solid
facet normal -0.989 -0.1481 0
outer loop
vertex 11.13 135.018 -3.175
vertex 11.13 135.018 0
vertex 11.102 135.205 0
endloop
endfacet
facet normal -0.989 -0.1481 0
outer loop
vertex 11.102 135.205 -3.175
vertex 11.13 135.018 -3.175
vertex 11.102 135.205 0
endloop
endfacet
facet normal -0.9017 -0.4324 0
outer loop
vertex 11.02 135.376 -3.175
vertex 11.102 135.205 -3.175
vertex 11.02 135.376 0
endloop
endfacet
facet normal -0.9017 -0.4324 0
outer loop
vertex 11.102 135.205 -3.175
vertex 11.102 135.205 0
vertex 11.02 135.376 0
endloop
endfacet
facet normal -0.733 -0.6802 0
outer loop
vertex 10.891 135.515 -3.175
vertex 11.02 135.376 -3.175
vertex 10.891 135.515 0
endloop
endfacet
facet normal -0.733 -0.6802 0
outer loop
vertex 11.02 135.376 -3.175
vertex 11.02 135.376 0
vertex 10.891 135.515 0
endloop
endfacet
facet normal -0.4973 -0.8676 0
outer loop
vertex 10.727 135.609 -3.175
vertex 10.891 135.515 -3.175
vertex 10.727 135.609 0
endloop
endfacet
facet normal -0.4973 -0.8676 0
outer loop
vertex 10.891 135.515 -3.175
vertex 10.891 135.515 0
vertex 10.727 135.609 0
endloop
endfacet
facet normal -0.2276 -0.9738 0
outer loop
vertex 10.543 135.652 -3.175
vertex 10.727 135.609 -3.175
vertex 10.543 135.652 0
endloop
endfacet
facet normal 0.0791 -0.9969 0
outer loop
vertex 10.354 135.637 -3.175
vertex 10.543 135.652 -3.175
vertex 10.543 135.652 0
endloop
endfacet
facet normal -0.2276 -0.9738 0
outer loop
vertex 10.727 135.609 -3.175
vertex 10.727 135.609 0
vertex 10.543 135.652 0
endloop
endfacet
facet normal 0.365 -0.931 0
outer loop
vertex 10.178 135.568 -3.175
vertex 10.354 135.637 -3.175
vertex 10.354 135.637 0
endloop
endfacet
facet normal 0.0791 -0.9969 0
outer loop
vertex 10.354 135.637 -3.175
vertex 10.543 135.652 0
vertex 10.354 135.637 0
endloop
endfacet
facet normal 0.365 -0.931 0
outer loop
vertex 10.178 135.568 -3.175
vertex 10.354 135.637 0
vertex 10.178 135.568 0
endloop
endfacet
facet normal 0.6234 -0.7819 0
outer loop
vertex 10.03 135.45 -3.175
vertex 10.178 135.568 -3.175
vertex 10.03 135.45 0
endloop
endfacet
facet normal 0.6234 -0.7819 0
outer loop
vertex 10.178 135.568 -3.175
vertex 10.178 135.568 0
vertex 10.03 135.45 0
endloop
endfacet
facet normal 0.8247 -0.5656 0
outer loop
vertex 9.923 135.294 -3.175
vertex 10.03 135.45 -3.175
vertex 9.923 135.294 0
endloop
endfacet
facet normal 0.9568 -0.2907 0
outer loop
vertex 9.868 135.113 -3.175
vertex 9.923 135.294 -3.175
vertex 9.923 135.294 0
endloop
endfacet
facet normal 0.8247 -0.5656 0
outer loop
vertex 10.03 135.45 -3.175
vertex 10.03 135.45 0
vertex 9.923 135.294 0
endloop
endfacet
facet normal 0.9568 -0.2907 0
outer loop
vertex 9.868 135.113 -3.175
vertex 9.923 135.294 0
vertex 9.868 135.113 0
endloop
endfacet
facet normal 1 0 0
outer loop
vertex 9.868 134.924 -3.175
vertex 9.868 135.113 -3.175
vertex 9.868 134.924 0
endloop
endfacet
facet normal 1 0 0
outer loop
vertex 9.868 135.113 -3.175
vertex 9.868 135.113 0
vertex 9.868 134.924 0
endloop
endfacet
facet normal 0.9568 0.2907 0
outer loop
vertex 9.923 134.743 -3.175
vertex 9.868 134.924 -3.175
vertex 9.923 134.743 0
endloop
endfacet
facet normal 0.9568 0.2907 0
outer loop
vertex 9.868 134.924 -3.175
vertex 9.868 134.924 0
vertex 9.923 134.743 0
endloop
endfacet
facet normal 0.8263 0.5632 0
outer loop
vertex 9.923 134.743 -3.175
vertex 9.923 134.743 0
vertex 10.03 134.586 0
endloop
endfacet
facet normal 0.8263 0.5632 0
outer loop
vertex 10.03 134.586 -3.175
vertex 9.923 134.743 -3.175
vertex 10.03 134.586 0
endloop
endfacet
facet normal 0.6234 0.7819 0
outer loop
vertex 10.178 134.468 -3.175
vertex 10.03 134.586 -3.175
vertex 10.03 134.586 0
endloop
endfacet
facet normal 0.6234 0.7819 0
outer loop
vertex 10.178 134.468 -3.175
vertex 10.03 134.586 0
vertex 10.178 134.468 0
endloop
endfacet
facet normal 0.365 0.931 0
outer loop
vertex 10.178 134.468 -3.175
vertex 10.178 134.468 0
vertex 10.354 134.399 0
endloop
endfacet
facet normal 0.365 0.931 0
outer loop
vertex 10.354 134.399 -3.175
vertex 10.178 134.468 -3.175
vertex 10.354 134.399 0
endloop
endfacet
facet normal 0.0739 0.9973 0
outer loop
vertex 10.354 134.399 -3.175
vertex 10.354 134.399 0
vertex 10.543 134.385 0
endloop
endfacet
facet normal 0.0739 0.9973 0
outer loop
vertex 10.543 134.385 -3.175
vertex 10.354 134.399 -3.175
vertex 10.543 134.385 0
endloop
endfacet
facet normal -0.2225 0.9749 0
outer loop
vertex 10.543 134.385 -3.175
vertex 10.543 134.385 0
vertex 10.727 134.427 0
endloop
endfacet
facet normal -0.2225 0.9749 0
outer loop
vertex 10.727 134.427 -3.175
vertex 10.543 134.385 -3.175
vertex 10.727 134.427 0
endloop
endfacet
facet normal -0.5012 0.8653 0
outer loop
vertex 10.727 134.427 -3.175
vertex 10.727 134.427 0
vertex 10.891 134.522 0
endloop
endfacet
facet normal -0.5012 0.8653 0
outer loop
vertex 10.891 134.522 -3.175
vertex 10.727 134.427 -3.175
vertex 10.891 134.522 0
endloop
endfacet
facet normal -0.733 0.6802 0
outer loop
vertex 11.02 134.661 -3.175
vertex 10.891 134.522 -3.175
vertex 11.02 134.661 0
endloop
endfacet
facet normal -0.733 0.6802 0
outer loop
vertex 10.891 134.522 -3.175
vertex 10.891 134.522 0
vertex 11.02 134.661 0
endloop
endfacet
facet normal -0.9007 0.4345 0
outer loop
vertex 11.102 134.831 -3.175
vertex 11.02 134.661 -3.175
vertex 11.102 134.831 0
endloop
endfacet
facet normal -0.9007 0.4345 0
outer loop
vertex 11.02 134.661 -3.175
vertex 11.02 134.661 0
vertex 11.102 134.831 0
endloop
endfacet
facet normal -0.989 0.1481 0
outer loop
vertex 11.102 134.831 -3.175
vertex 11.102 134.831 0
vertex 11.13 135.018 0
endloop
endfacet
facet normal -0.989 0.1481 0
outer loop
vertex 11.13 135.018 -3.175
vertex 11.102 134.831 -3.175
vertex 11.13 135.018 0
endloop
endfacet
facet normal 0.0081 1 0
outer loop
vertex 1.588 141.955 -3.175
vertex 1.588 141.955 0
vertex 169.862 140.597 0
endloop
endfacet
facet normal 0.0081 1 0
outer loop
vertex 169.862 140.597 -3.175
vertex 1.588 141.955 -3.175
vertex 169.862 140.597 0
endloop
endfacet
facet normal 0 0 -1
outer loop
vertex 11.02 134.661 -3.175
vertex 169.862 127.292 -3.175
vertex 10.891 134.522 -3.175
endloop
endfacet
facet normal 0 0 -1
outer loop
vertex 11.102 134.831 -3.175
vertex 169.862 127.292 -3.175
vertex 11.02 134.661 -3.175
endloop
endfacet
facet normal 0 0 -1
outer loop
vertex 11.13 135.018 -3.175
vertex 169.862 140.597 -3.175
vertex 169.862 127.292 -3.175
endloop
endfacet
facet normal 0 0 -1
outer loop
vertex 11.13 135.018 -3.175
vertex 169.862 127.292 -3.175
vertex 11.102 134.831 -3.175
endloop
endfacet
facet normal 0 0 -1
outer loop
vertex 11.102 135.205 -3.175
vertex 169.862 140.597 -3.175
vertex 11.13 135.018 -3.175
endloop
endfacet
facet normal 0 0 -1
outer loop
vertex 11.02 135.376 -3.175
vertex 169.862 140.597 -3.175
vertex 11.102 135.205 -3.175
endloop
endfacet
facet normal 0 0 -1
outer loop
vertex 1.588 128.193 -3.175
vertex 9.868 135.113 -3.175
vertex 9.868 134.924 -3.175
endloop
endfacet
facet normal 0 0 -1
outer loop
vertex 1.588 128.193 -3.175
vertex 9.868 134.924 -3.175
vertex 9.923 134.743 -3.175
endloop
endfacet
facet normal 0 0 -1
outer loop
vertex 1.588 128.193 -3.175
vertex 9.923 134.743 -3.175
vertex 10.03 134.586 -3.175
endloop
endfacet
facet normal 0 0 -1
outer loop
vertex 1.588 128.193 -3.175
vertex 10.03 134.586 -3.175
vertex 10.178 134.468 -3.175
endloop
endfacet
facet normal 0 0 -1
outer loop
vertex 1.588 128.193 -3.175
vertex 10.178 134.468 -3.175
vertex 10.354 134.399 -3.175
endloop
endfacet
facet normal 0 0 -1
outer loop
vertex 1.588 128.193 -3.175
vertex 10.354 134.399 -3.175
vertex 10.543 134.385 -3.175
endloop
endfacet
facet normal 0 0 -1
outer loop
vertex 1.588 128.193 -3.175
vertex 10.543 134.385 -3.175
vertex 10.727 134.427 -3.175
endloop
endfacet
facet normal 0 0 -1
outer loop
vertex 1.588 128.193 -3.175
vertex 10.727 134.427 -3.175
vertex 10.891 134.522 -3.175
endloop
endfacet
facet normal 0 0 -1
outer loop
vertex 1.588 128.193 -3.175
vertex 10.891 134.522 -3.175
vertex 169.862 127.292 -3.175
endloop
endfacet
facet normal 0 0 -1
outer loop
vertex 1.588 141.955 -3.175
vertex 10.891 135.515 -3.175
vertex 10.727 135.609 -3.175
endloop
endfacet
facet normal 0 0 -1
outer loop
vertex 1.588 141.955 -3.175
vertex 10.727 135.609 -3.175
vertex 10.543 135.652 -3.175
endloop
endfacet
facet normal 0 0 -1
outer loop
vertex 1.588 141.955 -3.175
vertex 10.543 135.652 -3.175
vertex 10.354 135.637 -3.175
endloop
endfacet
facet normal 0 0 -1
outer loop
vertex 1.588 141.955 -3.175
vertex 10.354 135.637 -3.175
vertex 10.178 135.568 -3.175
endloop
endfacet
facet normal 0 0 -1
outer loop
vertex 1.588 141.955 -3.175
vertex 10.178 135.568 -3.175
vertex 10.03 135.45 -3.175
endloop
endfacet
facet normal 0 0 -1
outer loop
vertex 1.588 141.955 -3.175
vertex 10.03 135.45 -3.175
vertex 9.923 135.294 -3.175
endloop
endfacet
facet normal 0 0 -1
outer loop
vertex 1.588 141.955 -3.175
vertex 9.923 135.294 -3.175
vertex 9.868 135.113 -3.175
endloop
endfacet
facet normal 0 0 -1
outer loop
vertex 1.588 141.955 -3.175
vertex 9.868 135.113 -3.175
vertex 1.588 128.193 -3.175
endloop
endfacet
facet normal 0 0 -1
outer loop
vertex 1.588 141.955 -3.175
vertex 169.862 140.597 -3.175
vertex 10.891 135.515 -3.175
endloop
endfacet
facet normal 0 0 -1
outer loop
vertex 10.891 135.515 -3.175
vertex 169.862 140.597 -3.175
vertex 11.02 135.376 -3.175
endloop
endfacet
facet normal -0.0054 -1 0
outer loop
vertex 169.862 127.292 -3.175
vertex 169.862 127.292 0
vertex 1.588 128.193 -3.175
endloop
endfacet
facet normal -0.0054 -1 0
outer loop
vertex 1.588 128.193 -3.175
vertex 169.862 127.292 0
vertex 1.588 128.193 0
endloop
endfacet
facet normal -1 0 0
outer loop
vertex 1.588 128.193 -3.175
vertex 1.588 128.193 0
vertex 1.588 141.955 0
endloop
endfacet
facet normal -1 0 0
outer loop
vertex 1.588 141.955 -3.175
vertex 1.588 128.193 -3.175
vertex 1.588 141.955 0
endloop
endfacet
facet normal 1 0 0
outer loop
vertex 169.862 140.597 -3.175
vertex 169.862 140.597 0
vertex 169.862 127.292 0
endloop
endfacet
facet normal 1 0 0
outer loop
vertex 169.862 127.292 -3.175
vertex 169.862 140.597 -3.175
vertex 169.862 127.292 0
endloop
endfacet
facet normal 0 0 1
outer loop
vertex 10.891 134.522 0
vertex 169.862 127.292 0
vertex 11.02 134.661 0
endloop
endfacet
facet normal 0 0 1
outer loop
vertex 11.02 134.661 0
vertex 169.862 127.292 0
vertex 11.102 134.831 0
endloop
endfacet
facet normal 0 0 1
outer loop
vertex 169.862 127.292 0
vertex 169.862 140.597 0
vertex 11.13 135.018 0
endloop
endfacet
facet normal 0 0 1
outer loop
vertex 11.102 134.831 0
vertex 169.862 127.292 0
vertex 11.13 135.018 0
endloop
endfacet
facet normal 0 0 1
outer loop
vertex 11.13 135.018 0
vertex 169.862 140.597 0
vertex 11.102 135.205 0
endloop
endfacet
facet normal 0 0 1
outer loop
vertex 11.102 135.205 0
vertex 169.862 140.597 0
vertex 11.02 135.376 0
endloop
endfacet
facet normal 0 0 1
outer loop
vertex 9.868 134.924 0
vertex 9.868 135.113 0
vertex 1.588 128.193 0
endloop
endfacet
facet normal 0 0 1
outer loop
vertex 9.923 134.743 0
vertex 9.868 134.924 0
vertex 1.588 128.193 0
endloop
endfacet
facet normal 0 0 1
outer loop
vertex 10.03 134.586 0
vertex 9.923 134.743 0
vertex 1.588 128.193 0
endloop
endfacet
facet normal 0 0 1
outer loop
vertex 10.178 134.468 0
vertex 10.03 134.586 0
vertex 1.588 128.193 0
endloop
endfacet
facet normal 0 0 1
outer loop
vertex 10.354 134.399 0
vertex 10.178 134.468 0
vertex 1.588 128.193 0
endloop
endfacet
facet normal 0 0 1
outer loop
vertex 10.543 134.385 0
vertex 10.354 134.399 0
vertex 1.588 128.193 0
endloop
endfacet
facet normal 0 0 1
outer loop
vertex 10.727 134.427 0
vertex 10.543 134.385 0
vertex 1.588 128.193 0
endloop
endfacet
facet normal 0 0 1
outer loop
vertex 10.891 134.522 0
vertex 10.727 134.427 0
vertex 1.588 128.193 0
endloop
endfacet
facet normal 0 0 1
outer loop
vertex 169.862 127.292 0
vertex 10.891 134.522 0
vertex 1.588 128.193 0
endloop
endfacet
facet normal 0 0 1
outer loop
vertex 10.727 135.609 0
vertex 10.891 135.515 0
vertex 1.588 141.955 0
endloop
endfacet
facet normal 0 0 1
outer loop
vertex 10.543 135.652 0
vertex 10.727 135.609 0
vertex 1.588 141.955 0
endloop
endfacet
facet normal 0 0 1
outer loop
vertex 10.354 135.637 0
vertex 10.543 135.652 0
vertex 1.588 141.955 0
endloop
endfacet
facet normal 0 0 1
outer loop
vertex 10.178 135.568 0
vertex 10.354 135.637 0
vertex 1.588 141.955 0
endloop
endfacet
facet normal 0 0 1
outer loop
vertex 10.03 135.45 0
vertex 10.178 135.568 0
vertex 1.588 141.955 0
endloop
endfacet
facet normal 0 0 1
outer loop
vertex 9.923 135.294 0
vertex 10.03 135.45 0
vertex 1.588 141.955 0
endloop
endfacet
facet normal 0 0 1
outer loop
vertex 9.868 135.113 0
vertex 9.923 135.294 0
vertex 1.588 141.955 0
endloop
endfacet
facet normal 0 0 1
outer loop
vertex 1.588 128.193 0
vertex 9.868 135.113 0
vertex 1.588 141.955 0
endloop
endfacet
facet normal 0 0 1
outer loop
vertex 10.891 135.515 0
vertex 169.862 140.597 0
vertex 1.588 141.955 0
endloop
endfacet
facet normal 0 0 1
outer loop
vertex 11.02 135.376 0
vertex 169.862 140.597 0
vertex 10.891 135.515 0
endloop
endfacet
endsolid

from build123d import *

# Parameters (mm, degrees)
SKETCH1_R           = 0.635
BOSS_EXTRUDE1_DEPTH = 3.175


with BuildPart() as part:
    # Sketch1 → Boss-Extrude1 (new body)
    with BuildSketch(Plane.XY):
        Polygon((1.5875, 128.192969627), (1.5875, 141.955116052), (169.8625, 140.597136541), (169.8625, 127.291804233), align=None)
        with Locations((10.495441348, 135.01829257)):
            Circle(SKETCH1_R, mode=Mode.SUBTRACT)
    extrude(amount=-BOSS_EXTRUDE1_DEPTH)


solid = part.part
